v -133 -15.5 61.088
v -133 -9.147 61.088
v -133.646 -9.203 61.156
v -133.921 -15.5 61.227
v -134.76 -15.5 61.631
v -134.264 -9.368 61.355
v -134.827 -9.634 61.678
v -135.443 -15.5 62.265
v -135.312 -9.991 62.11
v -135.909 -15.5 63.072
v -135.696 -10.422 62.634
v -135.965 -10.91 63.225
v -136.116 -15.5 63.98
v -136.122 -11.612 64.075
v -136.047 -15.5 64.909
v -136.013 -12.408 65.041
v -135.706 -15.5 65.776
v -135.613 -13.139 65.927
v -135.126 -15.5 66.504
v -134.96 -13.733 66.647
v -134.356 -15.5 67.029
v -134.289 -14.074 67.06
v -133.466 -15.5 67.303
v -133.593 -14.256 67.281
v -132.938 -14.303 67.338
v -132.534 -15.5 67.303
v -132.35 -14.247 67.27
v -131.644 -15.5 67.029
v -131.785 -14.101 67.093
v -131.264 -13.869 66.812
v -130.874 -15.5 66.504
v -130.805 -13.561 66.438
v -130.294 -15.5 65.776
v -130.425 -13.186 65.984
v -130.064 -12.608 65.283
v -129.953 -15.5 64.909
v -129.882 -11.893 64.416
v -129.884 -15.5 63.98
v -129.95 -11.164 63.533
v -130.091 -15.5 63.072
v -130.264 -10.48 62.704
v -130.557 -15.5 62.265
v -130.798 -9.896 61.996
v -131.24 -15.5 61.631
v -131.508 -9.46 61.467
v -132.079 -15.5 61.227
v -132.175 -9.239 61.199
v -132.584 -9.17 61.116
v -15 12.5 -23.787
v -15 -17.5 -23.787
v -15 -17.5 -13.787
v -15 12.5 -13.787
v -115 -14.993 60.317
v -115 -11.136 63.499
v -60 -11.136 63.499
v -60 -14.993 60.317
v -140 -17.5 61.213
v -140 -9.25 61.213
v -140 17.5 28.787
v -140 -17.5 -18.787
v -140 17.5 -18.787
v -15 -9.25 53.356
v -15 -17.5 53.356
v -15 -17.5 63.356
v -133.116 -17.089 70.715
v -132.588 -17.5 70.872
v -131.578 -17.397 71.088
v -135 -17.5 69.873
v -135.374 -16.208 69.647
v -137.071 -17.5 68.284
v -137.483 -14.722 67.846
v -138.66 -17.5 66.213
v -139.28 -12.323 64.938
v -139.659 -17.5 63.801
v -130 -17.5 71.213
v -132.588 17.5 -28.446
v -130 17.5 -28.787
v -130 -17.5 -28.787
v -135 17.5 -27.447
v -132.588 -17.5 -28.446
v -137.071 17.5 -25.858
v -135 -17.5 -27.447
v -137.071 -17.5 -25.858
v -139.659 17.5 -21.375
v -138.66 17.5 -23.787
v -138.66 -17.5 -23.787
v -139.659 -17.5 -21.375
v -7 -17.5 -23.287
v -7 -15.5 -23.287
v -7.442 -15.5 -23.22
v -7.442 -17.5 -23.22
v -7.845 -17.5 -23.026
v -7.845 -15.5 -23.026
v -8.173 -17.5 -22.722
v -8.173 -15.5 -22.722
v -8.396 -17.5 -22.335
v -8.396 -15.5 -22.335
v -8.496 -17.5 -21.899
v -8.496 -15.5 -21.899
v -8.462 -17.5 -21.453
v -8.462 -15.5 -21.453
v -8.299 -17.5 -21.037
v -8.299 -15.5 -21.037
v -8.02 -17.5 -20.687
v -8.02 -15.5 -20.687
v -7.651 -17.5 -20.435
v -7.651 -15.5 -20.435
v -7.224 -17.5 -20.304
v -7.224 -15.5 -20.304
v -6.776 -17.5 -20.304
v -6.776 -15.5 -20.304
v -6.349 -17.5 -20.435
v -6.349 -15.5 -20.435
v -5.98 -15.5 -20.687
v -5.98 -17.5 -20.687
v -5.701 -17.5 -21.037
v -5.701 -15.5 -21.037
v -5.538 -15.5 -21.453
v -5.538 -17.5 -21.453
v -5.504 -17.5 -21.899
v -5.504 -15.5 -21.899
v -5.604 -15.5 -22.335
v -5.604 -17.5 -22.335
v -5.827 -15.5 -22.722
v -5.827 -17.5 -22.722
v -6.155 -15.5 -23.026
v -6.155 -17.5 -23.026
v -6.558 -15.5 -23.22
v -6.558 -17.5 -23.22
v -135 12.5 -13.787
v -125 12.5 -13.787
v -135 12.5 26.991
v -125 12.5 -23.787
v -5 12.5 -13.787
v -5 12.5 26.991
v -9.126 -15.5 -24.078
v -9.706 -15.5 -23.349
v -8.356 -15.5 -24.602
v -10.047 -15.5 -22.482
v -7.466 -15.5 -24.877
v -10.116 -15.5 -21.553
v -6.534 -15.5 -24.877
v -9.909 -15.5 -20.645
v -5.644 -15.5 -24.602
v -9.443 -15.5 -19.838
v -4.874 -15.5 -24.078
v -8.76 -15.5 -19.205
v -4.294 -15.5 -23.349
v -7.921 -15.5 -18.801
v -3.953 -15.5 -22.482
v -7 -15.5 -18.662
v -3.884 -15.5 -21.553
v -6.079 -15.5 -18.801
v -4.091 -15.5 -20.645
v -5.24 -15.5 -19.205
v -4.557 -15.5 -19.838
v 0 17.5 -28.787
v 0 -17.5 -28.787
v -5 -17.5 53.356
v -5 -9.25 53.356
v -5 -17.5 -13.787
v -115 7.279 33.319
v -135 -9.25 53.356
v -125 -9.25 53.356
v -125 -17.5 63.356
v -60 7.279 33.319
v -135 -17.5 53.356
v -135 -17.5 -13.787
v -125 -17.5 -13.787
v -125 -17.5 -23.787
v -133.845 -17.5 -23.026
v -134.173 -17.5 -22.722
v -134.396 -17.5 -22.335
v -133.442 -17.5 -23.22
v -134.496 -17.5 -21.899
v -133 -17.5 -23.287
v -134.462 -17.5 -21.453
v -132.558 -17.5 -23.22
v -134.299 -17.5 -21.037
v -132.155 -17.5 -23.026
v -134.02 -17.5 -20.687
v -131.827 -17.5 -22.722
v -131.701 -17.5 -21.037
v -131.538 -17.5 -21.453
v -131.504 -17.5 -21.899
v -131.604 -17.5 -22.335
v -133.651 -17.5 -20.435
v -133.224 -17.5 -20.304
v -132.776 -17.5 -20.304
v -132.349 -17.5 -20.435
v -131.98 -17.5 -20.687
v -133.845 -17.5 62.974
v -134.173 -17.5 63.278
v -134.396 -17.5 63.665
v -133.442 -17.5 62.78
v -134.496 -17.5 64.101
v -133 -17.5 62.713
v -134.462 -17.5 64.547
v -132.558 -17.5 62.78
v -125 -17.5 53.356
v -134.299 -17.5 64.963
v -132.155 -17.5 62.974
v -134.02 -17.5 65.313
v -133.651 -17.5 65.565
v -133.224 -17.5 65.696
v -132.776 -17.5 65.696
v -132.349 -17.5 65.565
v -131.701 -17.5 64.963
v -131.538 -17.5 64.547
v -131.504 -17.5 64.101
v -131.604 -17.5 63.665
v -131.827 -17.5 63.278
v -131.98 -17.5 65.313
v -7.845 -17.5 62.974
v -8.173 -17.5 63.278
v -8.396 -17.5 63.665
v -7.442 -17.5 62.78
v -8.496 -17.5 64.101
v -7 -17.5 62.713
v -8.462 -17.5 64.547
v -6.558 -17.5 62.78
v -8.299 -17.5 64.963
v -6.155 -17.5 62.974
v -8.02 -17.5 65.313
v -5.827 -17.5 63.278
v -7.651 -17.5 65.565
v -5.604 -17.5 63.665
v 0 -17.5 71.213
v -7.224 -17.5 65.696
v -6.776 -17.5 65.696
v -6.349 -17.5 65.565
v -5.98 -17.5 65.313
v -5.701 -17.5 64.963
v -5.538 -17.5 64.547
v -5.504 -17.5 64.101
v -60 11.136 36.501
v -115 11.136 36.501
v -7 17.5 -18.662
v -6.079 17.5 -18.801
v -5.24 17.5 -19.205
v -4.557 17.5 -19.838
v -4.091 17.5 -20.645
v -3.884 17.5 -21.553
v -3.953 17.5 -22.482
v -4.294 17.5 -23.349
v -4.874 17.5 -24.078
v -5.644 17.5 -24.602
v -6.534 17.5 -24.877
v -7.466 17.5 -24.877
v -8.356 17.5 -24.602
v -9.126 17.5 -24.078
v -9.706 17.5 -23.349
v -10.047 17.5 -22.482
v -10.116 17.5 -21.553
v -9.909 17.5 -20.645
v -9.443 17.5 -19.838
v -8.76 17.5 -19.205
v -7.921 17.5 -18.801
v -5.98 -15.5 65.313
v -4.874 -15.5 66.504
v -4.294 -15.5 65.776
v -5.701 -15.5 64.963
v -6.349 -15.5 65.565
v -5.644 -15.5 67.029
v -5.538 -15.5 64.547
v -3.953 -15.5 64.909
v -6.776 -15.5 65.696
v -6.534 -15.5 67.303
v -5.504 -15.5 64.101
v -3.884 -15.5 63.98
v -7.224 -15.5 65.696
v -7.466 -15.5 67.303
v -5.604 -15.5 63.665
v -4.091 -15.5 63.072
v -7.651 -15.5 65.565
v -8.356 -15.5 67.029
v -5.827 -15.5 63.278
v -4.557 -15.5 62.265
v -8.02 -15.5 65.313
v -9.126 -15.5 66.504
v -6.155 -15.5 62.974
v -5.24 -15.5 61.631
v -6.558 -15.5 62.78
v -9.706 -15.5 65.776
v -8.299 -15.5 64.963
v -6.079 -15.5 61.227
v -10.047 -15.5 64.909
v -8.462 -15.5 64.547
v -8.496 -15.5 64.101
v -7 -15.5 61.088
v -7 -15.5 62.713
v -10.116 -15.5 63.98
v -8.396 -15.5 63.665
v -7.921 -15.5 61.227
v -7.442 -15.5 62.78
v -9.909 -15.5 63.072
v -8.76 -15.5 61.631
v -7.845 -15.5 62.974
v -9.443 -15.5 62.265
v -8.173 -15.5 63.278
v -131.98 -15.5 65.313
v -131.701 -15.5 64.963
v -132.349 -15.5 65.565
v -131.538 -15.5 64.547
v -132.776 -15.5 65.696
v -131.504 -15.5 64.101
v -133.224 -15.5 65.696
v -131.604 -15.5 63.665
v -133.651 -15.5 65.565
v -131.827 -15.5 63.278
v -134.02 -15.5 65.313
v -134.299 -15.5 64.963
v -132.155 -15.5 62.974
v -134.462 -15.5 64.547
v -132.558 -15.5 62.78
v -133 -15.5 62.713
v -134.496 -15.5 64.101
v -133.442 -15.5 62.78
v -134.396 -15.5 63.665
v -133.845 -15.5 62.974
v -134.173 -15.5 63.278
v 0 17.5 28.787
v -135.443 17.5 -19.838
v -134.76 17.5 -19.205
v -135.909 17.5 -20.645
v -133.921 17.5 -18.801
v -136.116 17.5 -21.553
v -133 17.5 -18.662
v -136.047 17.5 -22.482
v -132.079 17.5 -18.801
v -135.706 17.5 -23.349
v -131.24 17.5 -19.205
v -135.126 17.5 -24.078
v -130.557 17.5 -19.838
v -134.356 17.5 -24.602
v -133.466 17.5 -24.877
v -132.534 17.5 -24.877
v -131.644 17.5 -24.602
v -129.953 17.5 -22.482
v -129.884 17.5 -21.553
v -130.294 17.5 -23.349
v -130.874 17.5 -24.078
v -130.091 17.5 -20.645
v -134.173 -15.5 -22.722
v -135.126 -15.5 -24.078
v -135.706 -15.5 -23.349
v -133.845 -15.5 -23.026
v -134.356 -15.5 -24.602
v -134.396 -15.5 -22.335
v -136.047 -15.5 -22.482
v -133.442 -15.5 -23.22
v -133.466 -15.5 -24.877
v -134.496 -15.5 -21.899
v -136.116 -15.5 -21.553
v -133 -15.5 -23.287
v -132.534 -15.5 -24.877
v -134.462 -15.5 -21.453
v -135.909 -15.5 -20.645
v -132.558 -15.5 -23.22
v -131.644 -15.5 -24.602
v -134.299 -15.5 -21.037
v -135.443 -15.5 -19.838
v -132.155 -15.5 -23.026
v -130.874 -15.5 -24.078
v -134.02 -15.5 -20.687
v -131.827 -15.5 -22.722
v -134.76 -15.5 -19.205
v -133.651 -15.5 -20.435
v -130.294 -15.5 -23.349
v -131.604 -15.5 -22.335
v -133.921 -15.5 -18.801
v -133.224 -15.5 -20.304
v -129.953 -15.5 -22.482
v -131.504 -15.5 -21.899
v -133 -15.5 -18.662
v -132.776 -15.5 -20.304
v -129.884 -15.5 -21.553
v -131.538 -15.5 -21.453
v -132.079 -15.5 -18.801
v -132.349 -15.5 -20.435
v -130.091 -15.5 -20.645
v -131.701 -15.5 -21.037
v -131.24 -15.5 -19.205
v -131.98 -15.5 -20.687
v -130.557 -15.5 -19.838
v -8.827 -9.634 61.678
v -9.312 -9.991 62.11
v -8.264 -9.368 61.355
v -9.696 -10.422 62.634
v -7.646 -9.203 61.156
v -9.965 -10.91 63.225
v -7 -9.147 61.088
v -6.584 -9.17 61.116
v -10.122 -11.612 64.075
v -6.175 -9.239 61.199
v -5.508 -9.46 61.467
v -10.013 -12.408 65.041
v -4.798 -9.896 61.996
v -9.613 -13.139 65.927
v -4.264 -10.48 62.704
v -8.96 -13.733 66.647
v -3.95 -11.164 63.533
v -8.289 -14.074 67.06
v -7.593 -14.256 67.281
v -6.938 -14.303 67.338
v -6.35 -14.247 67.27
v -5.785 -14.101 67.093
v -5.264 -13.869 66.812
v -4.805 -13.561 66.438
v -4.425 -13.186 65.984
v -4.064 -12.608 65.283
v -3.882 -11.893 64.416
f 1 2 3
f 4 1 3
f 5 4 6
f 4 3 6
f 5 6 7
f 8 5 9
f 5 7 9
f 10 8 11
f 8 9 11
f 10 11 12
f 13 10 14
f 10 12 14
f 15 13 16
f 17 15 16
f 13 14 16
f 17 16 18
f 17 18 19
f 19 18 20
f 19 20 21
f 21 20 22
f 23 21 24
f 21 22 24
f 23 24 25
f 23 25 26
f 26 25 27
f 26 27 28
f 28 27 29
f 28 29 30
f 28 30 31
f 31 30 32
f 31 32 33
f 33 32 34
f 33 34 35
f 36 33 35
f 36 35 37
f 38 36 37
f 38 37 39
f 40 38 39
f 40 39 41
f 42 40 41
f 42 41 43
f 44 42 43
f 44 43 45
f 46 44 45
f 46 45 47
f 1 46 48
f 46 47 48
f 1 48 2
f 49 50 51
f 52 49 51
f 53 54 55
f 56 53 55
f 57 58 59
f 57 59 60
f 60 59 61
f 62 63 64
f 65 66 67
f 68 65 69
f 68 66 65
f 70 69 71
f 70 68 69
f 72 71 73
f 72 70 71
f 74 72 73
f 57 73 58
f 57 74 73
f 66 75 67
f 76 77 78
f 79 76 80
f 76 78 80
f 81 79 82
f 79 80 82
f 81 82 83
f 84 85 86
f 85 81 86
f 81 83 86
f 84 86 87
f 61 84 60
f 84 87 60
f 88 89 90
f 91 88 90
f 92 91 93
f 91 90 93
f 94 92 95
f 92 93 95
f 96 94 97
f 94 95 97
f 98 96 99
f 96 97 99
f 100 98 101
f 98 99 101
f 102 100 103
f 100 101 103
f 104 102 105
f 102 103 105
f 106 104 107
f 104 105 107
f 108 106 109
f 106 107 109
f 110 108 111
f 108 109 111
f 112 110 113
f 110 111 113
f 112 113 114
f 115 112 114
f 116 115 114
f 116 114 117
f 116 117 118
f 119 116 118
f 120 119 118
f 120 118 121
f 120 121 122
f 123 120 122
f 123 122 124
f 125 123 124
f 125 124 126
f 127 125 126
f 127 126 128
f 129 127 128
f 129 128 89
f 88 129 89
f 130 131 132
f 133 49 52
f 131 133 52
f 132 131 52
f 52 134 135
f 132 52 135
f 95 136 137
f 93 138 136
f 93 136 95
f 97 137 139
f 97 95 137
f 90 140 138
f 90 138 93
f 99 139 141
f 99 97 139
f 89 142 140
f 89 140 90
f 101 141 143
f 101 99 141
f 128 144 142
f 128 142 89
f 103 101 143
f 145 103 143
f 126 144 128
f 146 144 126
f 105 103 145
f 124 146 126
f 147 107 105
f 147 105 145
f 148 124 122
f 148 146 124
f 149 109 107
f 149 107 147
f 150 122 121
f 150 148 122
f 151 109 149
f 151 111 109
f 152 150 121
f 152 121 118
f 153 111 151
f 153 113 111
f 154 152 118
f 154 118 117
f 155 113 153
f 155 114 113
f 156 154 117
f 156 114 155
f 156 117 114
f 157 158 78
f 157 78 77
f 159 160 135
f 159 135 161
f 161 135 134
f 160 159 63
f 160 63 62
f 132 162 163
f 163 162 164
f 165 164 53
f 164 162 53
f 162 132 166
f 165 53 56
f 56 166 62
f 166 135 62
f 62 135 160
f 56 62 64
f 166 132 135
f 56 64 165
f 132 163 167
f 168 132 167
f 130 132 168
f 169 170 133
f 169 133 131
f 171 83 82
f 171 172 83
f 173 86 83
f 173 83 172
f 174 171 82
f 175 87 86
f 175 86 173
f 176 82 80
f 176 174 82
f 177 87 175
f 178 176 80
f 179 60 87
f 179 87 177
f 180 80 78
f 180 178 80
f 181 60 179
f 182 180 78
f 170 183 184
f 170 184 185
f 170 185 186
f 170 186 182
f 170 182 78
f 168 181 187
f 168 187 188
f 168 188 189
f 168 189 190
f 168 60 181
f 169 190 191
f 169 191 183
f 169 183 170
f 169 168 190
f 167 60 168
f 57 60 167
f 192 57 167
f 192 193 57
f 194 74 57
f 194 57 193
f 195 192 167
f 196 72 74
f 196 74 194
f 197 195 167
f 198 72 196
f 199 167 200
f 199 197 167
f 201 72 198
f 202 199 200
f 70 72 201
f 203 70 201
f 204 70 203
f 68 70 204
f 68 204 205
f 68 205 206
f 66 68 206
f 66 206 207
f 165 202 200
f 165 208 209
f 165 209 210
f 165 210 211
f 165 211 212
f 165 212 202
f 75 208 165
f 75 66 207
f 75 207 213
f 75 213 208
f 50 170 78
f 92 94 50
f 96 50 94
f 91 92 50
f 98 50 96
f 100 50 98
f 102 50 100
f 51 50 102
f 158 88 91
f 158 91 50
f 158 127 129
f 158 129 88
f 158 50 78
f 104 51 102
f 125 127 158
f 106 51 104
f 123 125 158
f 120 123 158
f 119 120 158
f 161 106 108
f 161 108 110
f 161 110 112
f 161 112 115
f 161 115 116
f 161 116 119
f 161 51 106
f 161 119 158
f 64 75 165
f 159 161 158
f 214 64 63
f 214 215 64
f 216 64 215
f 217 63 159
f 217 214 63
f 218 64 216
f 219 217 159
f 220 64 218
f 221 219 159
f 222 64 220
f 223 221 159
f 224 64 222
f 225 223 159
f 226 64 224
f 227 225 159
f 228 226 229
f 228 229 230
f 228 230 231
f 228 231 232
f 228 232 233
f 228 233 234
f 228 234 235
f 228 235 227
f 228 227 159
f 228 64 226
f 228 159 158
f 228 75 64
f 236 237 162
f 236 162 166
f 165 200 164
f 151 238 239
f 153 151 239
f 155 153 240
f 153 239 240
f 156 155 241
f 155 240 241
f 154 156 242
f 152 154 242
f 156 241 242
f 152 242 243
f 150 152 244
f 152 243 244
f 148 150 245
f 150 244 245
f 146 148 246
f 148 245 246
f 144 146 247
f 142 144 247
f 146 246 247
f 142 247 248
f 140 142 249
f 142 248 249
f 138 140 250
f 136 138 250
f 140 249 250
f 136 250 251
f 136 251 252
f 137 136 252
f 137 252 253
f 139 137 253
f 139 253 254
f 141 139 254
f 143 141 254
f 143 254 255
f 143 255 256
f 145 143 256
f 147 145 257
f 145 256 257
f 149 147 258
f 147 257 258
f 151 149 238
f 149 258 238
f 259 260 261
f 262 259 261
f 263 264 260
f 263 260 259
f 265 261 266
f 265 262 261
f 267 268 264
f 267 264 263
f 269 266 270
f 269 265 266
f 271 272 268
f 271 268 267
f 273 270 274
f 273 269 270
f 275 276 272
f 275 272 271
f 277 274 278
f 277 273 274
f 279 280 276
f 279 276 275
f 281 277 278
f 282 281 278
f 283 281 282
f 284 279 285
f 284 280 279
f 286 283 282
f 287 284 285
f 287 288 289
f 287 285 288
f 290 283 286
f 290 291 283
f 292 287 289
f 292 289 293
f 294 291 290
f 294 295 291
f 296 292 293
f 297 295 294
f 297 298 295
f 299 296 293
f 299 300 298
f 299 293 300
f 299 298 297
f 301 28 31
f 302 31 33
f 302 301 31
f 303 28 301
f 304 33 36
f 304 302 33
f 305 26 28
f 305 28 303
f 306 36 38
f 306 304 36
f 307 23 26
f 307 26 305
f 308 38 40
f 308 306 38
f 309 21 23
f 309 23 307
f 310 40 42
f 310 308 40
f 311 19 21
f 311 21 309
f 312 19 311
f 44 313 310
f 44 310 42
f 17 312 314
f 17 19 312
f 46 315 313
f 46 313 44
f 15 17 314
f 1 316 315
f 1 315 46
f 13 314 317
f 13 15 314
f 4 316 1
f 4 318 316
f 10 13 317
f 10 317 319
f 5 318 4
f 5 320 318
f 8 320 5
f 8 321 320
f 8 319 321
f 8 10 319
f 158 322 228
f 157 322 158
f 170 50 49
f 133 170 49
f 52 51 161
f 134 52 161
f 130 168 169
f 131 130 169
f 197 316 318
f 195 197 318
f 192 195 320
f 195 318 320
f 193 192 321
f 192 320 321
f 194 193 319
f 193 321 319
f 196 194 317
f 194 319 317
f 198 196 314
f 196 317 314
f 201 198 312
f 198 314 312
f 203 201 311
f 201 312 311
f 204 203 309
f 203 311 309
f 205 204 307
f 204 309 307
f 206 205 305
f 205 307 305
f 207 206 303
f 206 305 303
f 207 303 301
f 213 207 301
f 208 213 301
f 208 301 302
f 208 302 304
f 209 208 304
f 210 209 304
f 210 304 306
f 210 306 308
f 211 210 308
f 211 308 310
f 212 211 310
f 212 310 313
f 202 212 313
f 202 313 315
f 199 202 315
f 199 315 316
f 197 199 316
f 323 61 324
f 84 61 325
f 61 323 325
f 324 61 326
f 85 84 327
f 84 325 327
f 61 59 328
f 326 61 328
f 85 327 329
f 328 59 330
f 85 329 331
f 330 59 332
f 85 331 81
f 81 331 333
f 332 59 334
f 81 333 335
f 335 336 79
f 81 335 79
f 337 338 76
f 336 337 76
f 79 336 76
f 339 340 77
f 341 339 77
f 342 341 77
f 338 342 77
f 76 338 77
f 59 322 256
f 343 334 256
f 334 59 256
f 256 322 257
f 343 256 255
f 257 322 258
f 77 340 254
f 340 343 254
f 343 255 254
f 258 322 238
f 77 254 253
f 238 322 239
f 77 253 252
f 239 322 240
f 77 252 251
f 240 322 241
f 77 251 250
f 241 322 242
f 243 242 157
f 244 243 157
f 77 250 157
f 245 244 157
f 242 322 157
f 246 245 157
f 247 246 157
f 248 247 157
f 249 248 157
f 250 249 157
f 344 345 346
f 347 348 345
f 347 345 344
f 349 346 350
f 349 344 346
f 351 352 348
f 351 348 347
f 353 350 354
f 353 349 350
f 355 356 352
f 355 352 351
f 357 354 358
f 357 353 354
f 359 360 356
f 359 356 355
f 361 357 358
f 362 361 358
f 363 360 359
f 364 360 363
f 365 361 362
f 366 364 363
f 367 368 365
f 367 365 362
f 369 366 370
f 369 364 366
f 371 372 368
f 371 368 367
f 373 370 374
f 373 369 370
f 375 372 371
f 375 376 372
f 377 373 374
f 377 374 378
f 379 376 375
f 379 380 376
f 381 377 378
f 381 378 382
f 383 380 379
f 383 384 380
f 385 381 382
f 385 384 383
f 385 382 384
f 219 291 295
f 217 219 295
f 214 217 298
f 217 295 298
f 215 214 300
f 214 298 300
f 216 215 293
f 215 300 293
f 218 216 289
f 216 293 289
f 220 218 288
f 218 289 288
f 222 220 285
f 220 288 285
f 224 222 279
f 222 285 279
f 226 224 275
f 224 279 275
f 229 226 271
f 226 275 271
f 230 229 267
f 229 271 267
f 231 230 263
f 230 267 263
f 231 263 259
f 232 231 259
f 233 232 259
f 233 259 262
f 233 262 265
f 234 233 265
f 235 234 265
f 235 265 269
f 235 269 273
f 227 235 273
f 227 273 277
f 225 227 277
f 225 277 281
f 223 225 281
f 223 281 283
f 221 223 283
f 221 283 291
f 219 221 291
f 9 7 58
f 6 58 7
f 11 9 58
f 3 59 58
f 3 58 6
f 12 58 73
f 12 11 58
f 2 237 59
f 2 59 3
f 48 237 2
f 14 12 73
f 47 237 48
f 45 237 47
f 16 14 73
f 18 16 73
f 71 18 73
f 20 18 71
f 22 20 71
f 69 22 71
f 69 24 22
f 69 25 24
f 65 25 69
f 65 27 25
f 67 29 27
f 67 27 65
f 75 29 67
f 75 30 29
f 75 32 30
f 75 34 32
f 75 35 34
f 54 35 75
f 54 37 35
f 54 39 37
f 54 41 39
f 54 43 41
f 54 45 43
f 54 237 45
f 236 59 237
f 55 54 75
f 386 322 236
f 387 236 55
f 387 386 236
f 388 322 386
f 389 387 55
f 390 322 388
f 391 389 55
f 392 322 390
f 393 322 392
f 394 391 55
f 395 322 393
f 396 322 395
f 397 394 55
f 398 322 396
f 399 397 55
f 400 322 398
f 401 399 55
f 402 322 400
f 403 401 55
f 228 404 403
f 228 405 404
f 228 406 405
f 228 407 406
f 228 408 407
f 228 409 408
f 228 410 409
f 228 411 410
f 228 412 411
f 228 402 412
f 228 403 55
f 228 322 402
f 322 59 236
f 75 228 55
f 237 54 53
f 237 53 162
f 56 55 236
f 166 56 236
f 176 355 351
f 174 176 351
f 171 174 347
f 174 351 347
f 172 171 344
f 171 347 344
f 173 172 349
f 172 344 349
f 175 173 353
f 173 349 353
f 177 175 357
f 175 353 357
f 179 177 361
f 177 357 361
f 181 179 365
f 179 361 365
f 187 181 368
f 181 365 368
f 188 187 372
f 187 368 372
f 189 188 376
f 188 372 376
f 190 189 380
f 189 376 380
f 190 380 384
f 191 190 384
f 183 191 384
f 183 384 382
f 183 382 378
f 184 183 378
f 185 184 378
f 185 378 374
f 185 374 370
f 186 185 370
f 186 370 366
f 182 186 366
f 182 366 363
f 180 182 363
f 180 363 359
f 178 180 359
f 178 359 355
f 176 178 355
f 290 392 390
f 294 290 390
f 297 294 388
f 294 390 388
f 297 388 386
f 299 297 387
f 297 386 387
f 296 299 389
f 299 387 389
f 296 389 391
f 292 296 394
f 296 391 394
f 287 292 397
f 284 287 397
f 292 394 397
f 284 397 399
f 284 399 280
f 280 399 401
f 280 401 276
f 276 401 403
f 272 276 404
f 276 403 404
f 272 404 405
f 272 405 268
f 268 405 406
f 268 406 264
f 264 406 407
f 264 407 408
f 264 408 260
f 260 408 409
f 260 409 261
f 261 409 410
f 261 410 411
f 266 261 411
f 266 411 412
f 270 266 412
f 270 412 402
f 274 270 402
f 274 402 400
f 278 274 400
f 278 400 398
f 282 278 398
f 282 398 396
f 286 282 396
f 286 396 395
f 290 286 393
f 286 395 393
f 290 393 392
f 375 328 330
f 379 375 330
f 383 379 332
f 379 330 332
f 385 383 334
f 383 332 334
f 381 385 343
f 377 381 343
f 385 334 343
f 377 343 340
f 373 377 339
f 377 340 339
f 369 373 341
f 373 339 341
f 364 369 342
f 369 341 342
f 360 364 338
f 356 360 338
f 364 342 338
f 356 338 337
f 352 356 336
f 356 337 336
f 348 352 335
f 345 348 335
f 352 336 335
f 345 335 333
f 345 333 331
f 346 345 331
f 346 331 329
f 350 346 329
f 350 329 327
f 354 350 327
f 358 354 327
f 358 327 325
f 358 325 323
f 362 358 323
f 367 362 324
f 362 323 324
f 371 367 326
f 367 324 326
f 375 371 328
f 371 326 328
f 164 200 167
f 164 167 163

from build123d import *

# Parameters (mm, degrees)
SKETCH2_W               = 57.573593128
SKETCH2_H               = 35
BOSS_EXTRUDE1_DEPTH     = 140
CUT_EXTRUDE1_DEPTH      = 65
CUT_EXTRUDE1_DEPTH_BACK = 65
SKETCH4_W               = 55
SKETCH4_H               = 35
CUT_EXTRUDE2_DEPTH      = 5
CUT_EXTRUDE3_DEPTH      = 161.923336852
BOSS_EXTRUDE2_START     = -135
BOSS_EXTRUDE2_DEPTH     = 10
BOSS_EXTRUDE2_START_2   = -15
BOSS_EXTRUDE2_2_DEPTH   = 10
SKETCH8_3_W             = 10
SKETCH8_3_H             = 10
BOSS_EXTRUDE3_DEPTH     = 30
SKETCH7_R               = 3.125
SKETCH7_R_2             = 1.5
CUT_EXTRUDE5_DEPTH      = 33
SKETCH7_4_R             = 1.5
CUT_EXTRUDE6_DEPTH      = 35


# Read off the part's stored shape, not the designer's step: Boss-Extrude2
with BuildPart() as part:
    # Sketch2 → Boss-Extrude1 (new body)
    with BuildSketch(Plane(origin=(0, 0, 0), x_dir=(0, 0, -1), z_dir=(1, 0, 0))):
        Polygon((-28.786796564, 17.5), (-71.213203436, -17.5), (-28.786796564, -17.5), align=None)
        Rectangle(SKETCH2_W, SKETCH2_H)
        Polygon((-26.990568975, 12.5), (-28.786796564, 11.018187839), (-28.786796564, -17.5), (23.786796564, -17.5), (23.786796564, 12.5), align=None)
        Polygon((-28.786796564, -17.5), (-28.786796564, 11.018187839), (-63.356060578, -17.5), align=None)
    extrude(amount=-BOSS_EXTRUDE1_DEPTH)

    # Sketch3 → Cut-Extrude1 (cut, two sides: drawn at the far end of the back side and taken through both)
    with BuildSketch(Plane.ZY.offset(70).offset(-CUT_EXTRUDE1_DEPTH_BACK)):
        Polygon((-23.786796564, -17.5), (-23.786796564, 12.5), (26.990568975, 12.5), (63.356060578, -17.5), align=None)
    extrude(amount=CUT_EXTRUDE1_DEPTH + CUT_EXTRUDE1_DEPTH_BACK, mode=Mode.SUBTRACT)

    # Sketch4 → Cut-Extrude2 (cut)
    with BuildSketch(Plane(origin=(0, 24.544202322, 20.247933884), x_dir=(1, 0, 0), z_dir=(0, 0.77138921583987, 0.6363636363636365))):
        with Locations((-87.5, -38.569460792)):
            Rectangle(SKETCH4_W, SKETCH4_H)
    extrude(amount=-CUT_EXTRUDE2_DEPTH, mode=Mode.SUBTRACT)

    # Sketch6 → Cut-Extrude3 (cut, through all)
    with BuildSketch(Plane.XZ.offset(17.5)):
        with BuildLine():
            Line((-140, 61.213203436), (-140, 71.213203436))
            Line((-140, 71.213203436), (-130, 71.213203436))
            ThreePointArc((-130, 71.213203436), (-137.071067812, 68.284271247), (-140, 61.213203436))
        make_face()
        with BuildLine():
            Line((-140, -18.786796564), (-140, -28.786796564))
            Line((-140, -28.786796564), (-130, -28.786796564))
            ThreePointArc((-130, -28.786796564), (-137.071067812, -25.857864376), (-140, -18.786796564))
        make_face()
    extrude(amount=-CUT_EXTRUDE3_DEPTH, mode=Mode.SUBTRACT)

    # Boss-Extrude2 outline → Boss-Extrude2 (add)
    with BuildSketch(Plane.YZ.offset(BOSS_EXTRUDE2_START)):
        Polygon((-9.250420886, 53.356060578), (-17.5, 63.356060578), (-17.5, 53.356060578), align=None)
    extrude(amount=BOSS_EXTRUDE2_DEPTH)

    # Boss-Extrude2 2 outline → Boss-Extrude2 2 (add)
    with BuildSketch(Plane.YZ.offset(BOSS_EXTRUDE2_START_2)):
        Polygon((-9.250420886, 53.356060578), (-17.5, 63.356060578), (-17.5, 53.356060578), align=None)
    extrude(amount=BOSS_EXTRUDE2_2_DEPTH)

    # Sketch8<3> → Boss-Extrude3 (add)
    with BuildSketch(Plane.XZ.offset(17.5)):
        with Locations((-130, -18.786796564)):
            Rectangle(SKETCH8_3_W, SKETCH8_3_H)
        with Locations((-10, -18.786796564)):
            Rectangle(SKETCH8_3_W, SKETCH8_3_H)
    extrude(amount=-BOSS_EXTRUDE3_DEPTH)

    # Sketch7 → Cut-Extrude5 (cut)
    # profile 1 of 4: a face of its own
    with BuildSketch(Plane(origin=(0, 17.5, 0), x_dir=(1, 0, 0), z_dir=(0, 1, 0))):
        with Locations(Location((-133, 21.786796564, 0), (0, 0, 270))):
            Circle(SKETCH7_R)
        with Locations(Location((-133, 21.786796564, 0), (0, 0, 270))):
            Circle(SKETCH7_R_2, mode=Mode.SUBTRACT)
    # profile 2 of 4: a face of its own
    with BuildSketch(Plane(origin=(0, 17.5, 0), x_dir=(1, 0, 0), z_dir=(0, 1, 0))):
        with Locations(Location((-7, 21.786796564, 0), (0, 0, 270))):
            Circle(SKETCH7_R)
        with Locations(Location((-7, 21.786796564, 0), (0, 0, 270))):
            Circle(SKETCH7_R_2, mode=Mode.SUBTRACT)
    # profile 3 of 4: a face of its own
    with BuildSketch(Plane(origin=(0, 17.5, 0), x_dir=(1, 0, 0), z_dir=(0, 1, 0))):
        with Locations(Location((-7, -64.213203436, 0), (0, 0, 90))):
            Circle(SKETCH7_R)
        with Locations(Location((-7, -64.213203436, 0), (0, 0, 90))):
            Circle(SKETCH7_R_2, mode=Mode.SUBTRACT)
    # profile 4 of 4: a face of its own
    with BuildSketch(Plane(origin=(0, 17.5, 0), x_dir=(1, 0, 0), z_dir=(0, 1, 0))):
        with Locations(Location((-133, -64.213203436, 0), (0, 0, 90))):
            Circle(SKETCH7_R)
        with Locations(Location((-133, -64.213203436, 0), (0, 0, 90))):
            Circle(SKETCH7_R_2, mode=Mode.SUBTRACT)
    extrude(amount=-CUT_EXTRUDE5_DEPTH, mode=Mode.SUBTRACT)

    # Sketch7<4> → Cut-Extrude6 (cut)
    with BuildSketch(Plane(origin=(0, 17.5, 0), x_dir=(1, 0, 0), z_dir=(0, 1, 0))):
        with Locations(Location((-133, -64.213203436, 0), (0, 0, 90))):
            Circle(SKETCH7_4_R)
        with Locations(Location((-133, 21.786796564, 0), (0, 0, 90))):
            Circle(SKETCH7_4_R)
        with Locations(Location((-7, 21.786796564, 0), (0, 0, 90))):
            Circle(SKETCH7_4_R)
        with Locations(Location((-7, -64.213203436, 0), (0, 0, 90))):
            Circle(SKETCH7_4_R)
    extrude(amount=-CUT_EXTRUDE6_DEPTH, mode=Mode.SUBTRACT)


solid = part.part
